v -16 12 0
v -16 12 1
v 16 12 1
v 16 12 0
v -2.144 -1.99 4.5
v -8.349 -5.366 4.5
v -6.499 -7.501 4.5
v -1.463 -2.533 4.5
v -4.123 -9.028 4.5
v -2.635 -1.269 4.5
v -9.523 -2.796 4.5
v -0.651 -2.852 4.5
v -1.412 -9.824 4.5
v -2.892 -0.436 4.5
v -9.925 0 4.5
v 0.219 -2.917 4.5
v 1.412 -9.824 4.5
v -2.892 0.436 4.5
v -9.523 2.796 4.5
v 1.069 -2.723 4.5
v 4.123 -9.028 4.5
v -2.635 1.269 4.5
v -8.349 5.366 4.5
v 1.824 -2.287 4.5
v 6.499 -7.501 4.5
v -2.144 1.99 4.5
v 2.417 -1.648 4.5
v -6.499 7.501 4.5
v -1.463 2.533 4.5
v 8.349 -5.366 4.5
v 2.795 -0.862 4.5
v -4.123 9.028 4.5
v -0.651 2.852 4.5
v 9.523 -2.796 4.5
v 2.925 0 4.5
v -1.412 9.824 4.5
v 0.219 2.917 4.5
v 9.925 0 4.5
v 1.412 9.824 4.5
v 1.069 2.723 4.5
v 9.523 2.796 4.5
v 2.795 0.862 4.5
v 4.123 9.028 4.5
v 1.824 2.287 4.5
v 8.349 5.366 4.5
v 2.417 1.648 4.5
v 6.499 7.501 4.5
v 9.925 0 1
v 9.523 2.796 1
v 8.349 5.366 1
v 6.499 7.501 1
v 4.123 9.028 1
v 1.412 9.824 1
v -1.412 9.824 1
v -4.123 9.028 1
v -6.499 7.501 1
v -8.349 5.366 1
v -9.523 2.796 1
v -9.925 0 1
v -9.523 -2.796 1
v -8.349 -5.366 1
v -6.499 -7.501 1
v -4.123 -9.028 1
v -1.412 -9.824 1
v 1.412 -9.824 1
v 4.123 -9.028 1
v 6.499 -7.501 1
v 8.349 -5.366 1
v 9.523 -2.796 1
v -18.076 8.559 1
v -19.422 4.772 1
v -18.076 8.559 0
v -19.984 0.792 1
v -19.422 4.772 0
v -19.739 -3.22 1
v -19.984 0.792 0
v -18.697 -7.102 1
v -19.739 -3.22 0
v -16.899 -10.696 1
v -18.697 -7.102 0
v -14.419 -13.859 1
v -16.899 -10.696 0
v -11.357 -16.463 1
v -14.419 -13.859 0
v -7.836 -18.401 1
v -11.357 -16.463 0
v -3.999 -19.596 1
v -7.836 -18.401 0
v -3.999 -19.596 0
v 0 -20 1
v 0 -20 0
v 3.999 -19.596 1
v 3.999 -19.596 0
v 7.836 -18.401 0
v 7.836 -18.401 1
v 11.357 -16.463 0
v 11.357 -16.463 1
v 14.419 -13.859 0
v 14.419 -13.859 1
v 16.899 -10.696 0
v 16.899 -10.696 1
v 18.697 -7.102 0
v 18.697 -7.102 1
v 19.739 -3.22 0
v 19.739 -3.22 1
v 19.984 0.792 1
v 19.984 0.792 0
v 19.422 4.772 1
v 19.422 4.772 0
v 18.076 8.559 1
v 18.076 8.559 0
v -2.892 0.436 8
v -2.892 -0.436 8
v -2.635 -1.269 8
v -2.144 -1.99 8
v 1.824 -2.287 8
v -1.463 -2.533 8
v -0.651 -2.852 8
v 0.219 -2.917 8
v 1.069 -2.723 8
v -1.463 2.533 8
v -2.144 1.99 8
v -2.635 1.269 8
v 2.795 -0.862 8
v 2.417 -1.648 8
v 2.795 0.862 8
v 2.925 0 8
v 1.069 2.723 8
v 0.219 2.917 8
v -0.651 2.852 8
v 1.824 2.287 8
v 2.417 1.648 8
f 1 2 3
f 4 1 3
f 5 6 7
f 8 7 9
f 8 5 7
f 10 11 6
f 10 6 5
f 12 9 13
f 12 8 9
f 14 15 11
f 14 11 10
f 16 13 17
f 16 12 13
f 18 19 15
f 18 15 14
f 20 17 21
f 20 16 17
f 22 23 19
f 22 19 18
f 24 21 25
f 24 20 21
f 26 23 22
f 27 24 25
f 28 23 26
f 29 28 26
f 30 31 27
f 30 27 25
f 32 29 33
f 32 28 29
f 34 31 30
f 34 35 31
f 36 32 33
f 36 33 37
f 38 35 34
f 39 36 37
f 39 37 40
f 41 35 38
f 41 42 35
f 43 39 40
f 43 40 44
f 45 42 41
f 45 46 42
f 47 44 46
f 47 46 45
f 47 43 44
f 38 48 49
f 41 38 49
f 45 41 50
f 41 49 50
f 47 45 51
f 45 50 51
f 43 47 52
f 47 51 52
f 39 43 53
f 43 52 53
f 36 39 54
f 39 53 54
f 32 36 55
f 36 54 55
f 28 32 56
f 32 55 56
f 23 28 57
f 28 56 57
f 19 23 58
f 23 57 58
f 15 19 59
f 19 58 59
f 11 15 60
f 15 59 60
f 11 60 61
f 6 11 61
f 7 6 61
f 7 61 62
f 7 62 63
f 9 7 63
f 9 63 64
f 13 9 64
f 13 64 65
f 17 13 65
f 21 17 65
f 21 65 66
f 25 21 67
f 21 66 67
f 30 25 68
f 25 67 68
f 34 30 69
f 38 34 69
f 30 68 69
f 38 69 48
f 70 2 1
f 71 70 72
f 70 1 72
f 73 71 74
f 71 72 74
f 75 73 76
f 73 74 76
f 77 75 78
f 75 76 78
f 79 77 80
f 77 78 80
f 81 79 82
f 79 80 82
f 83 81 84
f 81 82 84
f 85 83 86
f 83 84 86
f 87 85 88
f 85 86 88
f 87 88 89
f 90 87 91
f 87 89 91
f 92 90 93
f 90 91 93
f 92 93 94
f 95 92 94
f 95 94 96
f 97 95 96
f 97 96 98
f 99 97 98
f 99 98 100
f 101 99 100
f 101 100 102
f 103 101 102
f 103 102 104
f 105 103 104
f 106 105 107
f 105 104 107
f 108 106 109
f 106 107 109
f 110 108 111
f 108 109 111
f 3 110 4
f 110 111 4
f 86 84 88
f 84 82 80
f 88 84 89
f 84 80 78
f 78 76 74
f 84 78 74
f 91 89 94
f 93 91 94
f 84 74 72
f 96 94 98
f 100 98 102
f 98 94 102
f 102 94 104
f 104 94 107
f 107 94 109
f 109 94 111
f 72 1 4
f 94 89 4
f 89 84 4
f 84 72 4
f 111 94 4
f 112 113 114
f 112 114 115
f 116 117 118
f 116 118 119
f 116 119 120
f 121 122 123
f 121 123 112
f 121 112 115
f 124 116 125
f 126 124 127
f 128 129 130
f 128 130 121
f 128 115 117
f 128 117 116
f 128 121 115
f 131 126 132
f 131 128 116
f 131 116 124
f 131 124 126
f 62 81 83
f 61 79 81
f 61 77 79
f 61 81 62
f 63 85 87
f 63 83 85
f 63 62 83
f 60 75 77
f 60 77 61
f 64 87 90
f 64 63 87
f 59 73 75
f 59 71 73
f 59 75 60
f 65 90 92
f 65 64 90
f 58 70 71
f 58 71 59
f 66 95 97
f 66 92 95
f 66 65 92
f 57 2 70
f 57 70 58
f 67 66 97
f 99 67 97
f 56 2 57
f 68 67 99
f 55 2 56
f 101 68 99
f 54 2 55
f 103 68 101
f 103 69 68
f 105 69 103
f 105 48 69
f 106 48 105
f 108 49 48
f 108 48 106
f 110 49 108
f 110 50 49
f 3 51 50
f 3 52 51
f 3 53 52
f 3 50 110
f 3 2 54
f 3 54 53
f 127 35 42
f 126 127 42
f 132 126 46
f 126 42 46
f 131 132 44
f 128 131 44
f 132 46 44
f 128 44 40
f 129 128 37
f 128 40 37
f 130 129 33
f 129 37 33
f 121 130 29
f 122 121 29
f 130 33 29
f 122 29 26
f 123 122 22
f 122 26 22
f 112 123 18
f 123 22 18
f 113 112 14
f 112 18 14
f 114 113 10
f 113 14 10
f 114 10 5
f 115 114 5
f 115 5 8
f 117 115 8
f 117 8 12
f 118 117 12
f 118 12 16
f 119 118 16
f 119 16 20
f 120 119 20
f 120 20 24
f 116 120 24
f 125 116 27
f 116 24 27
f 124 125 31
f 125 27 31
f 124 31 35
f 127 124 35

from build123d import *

# Parameters (mm, degrees)
F0_R     = 20
F1_DEPTH = 1
F2_R     = 9.925
F3_DEPTH = 3.5
F4_R     = 2.925
F5_DEPTH = 3.5
F6_W     = 16
F6_H     = 9
F7_DEPTH = 25


with BuildPart() as f1:
    # F0 (on Top) → F1 (new body)
    with BuildSketch(Plane.XY):
        Circle(F0_R)
    extrude(amount=F1_DEPTH)

    # F2 (on face) → F3 (join)
    with BuildSketch(Plane.XY.offset(1)):
        Circle(F2_R)
    extrude(amount=F3_DEPTH)

    # F4 (on face) → F5 (join)
    with BuildSketch(Plane.XY.offset(4.5)):
        Circle(F4_R)
    extrude(amount=F5_DEPTH)

    # F6 (on face) → F7 (cut)
    with BuildSketch(Plane.XY.offset(1)):
        with Locations((8, 16.5)):
            Rectangle(F6_W, F6_H)
        with Locations((-8, 16.5)):
            Rectangle(F6_W, F6_H)
    extrude(amount=-F7_DEPTH, mode=Mode.SUBTRACT)


solid = f1.part
